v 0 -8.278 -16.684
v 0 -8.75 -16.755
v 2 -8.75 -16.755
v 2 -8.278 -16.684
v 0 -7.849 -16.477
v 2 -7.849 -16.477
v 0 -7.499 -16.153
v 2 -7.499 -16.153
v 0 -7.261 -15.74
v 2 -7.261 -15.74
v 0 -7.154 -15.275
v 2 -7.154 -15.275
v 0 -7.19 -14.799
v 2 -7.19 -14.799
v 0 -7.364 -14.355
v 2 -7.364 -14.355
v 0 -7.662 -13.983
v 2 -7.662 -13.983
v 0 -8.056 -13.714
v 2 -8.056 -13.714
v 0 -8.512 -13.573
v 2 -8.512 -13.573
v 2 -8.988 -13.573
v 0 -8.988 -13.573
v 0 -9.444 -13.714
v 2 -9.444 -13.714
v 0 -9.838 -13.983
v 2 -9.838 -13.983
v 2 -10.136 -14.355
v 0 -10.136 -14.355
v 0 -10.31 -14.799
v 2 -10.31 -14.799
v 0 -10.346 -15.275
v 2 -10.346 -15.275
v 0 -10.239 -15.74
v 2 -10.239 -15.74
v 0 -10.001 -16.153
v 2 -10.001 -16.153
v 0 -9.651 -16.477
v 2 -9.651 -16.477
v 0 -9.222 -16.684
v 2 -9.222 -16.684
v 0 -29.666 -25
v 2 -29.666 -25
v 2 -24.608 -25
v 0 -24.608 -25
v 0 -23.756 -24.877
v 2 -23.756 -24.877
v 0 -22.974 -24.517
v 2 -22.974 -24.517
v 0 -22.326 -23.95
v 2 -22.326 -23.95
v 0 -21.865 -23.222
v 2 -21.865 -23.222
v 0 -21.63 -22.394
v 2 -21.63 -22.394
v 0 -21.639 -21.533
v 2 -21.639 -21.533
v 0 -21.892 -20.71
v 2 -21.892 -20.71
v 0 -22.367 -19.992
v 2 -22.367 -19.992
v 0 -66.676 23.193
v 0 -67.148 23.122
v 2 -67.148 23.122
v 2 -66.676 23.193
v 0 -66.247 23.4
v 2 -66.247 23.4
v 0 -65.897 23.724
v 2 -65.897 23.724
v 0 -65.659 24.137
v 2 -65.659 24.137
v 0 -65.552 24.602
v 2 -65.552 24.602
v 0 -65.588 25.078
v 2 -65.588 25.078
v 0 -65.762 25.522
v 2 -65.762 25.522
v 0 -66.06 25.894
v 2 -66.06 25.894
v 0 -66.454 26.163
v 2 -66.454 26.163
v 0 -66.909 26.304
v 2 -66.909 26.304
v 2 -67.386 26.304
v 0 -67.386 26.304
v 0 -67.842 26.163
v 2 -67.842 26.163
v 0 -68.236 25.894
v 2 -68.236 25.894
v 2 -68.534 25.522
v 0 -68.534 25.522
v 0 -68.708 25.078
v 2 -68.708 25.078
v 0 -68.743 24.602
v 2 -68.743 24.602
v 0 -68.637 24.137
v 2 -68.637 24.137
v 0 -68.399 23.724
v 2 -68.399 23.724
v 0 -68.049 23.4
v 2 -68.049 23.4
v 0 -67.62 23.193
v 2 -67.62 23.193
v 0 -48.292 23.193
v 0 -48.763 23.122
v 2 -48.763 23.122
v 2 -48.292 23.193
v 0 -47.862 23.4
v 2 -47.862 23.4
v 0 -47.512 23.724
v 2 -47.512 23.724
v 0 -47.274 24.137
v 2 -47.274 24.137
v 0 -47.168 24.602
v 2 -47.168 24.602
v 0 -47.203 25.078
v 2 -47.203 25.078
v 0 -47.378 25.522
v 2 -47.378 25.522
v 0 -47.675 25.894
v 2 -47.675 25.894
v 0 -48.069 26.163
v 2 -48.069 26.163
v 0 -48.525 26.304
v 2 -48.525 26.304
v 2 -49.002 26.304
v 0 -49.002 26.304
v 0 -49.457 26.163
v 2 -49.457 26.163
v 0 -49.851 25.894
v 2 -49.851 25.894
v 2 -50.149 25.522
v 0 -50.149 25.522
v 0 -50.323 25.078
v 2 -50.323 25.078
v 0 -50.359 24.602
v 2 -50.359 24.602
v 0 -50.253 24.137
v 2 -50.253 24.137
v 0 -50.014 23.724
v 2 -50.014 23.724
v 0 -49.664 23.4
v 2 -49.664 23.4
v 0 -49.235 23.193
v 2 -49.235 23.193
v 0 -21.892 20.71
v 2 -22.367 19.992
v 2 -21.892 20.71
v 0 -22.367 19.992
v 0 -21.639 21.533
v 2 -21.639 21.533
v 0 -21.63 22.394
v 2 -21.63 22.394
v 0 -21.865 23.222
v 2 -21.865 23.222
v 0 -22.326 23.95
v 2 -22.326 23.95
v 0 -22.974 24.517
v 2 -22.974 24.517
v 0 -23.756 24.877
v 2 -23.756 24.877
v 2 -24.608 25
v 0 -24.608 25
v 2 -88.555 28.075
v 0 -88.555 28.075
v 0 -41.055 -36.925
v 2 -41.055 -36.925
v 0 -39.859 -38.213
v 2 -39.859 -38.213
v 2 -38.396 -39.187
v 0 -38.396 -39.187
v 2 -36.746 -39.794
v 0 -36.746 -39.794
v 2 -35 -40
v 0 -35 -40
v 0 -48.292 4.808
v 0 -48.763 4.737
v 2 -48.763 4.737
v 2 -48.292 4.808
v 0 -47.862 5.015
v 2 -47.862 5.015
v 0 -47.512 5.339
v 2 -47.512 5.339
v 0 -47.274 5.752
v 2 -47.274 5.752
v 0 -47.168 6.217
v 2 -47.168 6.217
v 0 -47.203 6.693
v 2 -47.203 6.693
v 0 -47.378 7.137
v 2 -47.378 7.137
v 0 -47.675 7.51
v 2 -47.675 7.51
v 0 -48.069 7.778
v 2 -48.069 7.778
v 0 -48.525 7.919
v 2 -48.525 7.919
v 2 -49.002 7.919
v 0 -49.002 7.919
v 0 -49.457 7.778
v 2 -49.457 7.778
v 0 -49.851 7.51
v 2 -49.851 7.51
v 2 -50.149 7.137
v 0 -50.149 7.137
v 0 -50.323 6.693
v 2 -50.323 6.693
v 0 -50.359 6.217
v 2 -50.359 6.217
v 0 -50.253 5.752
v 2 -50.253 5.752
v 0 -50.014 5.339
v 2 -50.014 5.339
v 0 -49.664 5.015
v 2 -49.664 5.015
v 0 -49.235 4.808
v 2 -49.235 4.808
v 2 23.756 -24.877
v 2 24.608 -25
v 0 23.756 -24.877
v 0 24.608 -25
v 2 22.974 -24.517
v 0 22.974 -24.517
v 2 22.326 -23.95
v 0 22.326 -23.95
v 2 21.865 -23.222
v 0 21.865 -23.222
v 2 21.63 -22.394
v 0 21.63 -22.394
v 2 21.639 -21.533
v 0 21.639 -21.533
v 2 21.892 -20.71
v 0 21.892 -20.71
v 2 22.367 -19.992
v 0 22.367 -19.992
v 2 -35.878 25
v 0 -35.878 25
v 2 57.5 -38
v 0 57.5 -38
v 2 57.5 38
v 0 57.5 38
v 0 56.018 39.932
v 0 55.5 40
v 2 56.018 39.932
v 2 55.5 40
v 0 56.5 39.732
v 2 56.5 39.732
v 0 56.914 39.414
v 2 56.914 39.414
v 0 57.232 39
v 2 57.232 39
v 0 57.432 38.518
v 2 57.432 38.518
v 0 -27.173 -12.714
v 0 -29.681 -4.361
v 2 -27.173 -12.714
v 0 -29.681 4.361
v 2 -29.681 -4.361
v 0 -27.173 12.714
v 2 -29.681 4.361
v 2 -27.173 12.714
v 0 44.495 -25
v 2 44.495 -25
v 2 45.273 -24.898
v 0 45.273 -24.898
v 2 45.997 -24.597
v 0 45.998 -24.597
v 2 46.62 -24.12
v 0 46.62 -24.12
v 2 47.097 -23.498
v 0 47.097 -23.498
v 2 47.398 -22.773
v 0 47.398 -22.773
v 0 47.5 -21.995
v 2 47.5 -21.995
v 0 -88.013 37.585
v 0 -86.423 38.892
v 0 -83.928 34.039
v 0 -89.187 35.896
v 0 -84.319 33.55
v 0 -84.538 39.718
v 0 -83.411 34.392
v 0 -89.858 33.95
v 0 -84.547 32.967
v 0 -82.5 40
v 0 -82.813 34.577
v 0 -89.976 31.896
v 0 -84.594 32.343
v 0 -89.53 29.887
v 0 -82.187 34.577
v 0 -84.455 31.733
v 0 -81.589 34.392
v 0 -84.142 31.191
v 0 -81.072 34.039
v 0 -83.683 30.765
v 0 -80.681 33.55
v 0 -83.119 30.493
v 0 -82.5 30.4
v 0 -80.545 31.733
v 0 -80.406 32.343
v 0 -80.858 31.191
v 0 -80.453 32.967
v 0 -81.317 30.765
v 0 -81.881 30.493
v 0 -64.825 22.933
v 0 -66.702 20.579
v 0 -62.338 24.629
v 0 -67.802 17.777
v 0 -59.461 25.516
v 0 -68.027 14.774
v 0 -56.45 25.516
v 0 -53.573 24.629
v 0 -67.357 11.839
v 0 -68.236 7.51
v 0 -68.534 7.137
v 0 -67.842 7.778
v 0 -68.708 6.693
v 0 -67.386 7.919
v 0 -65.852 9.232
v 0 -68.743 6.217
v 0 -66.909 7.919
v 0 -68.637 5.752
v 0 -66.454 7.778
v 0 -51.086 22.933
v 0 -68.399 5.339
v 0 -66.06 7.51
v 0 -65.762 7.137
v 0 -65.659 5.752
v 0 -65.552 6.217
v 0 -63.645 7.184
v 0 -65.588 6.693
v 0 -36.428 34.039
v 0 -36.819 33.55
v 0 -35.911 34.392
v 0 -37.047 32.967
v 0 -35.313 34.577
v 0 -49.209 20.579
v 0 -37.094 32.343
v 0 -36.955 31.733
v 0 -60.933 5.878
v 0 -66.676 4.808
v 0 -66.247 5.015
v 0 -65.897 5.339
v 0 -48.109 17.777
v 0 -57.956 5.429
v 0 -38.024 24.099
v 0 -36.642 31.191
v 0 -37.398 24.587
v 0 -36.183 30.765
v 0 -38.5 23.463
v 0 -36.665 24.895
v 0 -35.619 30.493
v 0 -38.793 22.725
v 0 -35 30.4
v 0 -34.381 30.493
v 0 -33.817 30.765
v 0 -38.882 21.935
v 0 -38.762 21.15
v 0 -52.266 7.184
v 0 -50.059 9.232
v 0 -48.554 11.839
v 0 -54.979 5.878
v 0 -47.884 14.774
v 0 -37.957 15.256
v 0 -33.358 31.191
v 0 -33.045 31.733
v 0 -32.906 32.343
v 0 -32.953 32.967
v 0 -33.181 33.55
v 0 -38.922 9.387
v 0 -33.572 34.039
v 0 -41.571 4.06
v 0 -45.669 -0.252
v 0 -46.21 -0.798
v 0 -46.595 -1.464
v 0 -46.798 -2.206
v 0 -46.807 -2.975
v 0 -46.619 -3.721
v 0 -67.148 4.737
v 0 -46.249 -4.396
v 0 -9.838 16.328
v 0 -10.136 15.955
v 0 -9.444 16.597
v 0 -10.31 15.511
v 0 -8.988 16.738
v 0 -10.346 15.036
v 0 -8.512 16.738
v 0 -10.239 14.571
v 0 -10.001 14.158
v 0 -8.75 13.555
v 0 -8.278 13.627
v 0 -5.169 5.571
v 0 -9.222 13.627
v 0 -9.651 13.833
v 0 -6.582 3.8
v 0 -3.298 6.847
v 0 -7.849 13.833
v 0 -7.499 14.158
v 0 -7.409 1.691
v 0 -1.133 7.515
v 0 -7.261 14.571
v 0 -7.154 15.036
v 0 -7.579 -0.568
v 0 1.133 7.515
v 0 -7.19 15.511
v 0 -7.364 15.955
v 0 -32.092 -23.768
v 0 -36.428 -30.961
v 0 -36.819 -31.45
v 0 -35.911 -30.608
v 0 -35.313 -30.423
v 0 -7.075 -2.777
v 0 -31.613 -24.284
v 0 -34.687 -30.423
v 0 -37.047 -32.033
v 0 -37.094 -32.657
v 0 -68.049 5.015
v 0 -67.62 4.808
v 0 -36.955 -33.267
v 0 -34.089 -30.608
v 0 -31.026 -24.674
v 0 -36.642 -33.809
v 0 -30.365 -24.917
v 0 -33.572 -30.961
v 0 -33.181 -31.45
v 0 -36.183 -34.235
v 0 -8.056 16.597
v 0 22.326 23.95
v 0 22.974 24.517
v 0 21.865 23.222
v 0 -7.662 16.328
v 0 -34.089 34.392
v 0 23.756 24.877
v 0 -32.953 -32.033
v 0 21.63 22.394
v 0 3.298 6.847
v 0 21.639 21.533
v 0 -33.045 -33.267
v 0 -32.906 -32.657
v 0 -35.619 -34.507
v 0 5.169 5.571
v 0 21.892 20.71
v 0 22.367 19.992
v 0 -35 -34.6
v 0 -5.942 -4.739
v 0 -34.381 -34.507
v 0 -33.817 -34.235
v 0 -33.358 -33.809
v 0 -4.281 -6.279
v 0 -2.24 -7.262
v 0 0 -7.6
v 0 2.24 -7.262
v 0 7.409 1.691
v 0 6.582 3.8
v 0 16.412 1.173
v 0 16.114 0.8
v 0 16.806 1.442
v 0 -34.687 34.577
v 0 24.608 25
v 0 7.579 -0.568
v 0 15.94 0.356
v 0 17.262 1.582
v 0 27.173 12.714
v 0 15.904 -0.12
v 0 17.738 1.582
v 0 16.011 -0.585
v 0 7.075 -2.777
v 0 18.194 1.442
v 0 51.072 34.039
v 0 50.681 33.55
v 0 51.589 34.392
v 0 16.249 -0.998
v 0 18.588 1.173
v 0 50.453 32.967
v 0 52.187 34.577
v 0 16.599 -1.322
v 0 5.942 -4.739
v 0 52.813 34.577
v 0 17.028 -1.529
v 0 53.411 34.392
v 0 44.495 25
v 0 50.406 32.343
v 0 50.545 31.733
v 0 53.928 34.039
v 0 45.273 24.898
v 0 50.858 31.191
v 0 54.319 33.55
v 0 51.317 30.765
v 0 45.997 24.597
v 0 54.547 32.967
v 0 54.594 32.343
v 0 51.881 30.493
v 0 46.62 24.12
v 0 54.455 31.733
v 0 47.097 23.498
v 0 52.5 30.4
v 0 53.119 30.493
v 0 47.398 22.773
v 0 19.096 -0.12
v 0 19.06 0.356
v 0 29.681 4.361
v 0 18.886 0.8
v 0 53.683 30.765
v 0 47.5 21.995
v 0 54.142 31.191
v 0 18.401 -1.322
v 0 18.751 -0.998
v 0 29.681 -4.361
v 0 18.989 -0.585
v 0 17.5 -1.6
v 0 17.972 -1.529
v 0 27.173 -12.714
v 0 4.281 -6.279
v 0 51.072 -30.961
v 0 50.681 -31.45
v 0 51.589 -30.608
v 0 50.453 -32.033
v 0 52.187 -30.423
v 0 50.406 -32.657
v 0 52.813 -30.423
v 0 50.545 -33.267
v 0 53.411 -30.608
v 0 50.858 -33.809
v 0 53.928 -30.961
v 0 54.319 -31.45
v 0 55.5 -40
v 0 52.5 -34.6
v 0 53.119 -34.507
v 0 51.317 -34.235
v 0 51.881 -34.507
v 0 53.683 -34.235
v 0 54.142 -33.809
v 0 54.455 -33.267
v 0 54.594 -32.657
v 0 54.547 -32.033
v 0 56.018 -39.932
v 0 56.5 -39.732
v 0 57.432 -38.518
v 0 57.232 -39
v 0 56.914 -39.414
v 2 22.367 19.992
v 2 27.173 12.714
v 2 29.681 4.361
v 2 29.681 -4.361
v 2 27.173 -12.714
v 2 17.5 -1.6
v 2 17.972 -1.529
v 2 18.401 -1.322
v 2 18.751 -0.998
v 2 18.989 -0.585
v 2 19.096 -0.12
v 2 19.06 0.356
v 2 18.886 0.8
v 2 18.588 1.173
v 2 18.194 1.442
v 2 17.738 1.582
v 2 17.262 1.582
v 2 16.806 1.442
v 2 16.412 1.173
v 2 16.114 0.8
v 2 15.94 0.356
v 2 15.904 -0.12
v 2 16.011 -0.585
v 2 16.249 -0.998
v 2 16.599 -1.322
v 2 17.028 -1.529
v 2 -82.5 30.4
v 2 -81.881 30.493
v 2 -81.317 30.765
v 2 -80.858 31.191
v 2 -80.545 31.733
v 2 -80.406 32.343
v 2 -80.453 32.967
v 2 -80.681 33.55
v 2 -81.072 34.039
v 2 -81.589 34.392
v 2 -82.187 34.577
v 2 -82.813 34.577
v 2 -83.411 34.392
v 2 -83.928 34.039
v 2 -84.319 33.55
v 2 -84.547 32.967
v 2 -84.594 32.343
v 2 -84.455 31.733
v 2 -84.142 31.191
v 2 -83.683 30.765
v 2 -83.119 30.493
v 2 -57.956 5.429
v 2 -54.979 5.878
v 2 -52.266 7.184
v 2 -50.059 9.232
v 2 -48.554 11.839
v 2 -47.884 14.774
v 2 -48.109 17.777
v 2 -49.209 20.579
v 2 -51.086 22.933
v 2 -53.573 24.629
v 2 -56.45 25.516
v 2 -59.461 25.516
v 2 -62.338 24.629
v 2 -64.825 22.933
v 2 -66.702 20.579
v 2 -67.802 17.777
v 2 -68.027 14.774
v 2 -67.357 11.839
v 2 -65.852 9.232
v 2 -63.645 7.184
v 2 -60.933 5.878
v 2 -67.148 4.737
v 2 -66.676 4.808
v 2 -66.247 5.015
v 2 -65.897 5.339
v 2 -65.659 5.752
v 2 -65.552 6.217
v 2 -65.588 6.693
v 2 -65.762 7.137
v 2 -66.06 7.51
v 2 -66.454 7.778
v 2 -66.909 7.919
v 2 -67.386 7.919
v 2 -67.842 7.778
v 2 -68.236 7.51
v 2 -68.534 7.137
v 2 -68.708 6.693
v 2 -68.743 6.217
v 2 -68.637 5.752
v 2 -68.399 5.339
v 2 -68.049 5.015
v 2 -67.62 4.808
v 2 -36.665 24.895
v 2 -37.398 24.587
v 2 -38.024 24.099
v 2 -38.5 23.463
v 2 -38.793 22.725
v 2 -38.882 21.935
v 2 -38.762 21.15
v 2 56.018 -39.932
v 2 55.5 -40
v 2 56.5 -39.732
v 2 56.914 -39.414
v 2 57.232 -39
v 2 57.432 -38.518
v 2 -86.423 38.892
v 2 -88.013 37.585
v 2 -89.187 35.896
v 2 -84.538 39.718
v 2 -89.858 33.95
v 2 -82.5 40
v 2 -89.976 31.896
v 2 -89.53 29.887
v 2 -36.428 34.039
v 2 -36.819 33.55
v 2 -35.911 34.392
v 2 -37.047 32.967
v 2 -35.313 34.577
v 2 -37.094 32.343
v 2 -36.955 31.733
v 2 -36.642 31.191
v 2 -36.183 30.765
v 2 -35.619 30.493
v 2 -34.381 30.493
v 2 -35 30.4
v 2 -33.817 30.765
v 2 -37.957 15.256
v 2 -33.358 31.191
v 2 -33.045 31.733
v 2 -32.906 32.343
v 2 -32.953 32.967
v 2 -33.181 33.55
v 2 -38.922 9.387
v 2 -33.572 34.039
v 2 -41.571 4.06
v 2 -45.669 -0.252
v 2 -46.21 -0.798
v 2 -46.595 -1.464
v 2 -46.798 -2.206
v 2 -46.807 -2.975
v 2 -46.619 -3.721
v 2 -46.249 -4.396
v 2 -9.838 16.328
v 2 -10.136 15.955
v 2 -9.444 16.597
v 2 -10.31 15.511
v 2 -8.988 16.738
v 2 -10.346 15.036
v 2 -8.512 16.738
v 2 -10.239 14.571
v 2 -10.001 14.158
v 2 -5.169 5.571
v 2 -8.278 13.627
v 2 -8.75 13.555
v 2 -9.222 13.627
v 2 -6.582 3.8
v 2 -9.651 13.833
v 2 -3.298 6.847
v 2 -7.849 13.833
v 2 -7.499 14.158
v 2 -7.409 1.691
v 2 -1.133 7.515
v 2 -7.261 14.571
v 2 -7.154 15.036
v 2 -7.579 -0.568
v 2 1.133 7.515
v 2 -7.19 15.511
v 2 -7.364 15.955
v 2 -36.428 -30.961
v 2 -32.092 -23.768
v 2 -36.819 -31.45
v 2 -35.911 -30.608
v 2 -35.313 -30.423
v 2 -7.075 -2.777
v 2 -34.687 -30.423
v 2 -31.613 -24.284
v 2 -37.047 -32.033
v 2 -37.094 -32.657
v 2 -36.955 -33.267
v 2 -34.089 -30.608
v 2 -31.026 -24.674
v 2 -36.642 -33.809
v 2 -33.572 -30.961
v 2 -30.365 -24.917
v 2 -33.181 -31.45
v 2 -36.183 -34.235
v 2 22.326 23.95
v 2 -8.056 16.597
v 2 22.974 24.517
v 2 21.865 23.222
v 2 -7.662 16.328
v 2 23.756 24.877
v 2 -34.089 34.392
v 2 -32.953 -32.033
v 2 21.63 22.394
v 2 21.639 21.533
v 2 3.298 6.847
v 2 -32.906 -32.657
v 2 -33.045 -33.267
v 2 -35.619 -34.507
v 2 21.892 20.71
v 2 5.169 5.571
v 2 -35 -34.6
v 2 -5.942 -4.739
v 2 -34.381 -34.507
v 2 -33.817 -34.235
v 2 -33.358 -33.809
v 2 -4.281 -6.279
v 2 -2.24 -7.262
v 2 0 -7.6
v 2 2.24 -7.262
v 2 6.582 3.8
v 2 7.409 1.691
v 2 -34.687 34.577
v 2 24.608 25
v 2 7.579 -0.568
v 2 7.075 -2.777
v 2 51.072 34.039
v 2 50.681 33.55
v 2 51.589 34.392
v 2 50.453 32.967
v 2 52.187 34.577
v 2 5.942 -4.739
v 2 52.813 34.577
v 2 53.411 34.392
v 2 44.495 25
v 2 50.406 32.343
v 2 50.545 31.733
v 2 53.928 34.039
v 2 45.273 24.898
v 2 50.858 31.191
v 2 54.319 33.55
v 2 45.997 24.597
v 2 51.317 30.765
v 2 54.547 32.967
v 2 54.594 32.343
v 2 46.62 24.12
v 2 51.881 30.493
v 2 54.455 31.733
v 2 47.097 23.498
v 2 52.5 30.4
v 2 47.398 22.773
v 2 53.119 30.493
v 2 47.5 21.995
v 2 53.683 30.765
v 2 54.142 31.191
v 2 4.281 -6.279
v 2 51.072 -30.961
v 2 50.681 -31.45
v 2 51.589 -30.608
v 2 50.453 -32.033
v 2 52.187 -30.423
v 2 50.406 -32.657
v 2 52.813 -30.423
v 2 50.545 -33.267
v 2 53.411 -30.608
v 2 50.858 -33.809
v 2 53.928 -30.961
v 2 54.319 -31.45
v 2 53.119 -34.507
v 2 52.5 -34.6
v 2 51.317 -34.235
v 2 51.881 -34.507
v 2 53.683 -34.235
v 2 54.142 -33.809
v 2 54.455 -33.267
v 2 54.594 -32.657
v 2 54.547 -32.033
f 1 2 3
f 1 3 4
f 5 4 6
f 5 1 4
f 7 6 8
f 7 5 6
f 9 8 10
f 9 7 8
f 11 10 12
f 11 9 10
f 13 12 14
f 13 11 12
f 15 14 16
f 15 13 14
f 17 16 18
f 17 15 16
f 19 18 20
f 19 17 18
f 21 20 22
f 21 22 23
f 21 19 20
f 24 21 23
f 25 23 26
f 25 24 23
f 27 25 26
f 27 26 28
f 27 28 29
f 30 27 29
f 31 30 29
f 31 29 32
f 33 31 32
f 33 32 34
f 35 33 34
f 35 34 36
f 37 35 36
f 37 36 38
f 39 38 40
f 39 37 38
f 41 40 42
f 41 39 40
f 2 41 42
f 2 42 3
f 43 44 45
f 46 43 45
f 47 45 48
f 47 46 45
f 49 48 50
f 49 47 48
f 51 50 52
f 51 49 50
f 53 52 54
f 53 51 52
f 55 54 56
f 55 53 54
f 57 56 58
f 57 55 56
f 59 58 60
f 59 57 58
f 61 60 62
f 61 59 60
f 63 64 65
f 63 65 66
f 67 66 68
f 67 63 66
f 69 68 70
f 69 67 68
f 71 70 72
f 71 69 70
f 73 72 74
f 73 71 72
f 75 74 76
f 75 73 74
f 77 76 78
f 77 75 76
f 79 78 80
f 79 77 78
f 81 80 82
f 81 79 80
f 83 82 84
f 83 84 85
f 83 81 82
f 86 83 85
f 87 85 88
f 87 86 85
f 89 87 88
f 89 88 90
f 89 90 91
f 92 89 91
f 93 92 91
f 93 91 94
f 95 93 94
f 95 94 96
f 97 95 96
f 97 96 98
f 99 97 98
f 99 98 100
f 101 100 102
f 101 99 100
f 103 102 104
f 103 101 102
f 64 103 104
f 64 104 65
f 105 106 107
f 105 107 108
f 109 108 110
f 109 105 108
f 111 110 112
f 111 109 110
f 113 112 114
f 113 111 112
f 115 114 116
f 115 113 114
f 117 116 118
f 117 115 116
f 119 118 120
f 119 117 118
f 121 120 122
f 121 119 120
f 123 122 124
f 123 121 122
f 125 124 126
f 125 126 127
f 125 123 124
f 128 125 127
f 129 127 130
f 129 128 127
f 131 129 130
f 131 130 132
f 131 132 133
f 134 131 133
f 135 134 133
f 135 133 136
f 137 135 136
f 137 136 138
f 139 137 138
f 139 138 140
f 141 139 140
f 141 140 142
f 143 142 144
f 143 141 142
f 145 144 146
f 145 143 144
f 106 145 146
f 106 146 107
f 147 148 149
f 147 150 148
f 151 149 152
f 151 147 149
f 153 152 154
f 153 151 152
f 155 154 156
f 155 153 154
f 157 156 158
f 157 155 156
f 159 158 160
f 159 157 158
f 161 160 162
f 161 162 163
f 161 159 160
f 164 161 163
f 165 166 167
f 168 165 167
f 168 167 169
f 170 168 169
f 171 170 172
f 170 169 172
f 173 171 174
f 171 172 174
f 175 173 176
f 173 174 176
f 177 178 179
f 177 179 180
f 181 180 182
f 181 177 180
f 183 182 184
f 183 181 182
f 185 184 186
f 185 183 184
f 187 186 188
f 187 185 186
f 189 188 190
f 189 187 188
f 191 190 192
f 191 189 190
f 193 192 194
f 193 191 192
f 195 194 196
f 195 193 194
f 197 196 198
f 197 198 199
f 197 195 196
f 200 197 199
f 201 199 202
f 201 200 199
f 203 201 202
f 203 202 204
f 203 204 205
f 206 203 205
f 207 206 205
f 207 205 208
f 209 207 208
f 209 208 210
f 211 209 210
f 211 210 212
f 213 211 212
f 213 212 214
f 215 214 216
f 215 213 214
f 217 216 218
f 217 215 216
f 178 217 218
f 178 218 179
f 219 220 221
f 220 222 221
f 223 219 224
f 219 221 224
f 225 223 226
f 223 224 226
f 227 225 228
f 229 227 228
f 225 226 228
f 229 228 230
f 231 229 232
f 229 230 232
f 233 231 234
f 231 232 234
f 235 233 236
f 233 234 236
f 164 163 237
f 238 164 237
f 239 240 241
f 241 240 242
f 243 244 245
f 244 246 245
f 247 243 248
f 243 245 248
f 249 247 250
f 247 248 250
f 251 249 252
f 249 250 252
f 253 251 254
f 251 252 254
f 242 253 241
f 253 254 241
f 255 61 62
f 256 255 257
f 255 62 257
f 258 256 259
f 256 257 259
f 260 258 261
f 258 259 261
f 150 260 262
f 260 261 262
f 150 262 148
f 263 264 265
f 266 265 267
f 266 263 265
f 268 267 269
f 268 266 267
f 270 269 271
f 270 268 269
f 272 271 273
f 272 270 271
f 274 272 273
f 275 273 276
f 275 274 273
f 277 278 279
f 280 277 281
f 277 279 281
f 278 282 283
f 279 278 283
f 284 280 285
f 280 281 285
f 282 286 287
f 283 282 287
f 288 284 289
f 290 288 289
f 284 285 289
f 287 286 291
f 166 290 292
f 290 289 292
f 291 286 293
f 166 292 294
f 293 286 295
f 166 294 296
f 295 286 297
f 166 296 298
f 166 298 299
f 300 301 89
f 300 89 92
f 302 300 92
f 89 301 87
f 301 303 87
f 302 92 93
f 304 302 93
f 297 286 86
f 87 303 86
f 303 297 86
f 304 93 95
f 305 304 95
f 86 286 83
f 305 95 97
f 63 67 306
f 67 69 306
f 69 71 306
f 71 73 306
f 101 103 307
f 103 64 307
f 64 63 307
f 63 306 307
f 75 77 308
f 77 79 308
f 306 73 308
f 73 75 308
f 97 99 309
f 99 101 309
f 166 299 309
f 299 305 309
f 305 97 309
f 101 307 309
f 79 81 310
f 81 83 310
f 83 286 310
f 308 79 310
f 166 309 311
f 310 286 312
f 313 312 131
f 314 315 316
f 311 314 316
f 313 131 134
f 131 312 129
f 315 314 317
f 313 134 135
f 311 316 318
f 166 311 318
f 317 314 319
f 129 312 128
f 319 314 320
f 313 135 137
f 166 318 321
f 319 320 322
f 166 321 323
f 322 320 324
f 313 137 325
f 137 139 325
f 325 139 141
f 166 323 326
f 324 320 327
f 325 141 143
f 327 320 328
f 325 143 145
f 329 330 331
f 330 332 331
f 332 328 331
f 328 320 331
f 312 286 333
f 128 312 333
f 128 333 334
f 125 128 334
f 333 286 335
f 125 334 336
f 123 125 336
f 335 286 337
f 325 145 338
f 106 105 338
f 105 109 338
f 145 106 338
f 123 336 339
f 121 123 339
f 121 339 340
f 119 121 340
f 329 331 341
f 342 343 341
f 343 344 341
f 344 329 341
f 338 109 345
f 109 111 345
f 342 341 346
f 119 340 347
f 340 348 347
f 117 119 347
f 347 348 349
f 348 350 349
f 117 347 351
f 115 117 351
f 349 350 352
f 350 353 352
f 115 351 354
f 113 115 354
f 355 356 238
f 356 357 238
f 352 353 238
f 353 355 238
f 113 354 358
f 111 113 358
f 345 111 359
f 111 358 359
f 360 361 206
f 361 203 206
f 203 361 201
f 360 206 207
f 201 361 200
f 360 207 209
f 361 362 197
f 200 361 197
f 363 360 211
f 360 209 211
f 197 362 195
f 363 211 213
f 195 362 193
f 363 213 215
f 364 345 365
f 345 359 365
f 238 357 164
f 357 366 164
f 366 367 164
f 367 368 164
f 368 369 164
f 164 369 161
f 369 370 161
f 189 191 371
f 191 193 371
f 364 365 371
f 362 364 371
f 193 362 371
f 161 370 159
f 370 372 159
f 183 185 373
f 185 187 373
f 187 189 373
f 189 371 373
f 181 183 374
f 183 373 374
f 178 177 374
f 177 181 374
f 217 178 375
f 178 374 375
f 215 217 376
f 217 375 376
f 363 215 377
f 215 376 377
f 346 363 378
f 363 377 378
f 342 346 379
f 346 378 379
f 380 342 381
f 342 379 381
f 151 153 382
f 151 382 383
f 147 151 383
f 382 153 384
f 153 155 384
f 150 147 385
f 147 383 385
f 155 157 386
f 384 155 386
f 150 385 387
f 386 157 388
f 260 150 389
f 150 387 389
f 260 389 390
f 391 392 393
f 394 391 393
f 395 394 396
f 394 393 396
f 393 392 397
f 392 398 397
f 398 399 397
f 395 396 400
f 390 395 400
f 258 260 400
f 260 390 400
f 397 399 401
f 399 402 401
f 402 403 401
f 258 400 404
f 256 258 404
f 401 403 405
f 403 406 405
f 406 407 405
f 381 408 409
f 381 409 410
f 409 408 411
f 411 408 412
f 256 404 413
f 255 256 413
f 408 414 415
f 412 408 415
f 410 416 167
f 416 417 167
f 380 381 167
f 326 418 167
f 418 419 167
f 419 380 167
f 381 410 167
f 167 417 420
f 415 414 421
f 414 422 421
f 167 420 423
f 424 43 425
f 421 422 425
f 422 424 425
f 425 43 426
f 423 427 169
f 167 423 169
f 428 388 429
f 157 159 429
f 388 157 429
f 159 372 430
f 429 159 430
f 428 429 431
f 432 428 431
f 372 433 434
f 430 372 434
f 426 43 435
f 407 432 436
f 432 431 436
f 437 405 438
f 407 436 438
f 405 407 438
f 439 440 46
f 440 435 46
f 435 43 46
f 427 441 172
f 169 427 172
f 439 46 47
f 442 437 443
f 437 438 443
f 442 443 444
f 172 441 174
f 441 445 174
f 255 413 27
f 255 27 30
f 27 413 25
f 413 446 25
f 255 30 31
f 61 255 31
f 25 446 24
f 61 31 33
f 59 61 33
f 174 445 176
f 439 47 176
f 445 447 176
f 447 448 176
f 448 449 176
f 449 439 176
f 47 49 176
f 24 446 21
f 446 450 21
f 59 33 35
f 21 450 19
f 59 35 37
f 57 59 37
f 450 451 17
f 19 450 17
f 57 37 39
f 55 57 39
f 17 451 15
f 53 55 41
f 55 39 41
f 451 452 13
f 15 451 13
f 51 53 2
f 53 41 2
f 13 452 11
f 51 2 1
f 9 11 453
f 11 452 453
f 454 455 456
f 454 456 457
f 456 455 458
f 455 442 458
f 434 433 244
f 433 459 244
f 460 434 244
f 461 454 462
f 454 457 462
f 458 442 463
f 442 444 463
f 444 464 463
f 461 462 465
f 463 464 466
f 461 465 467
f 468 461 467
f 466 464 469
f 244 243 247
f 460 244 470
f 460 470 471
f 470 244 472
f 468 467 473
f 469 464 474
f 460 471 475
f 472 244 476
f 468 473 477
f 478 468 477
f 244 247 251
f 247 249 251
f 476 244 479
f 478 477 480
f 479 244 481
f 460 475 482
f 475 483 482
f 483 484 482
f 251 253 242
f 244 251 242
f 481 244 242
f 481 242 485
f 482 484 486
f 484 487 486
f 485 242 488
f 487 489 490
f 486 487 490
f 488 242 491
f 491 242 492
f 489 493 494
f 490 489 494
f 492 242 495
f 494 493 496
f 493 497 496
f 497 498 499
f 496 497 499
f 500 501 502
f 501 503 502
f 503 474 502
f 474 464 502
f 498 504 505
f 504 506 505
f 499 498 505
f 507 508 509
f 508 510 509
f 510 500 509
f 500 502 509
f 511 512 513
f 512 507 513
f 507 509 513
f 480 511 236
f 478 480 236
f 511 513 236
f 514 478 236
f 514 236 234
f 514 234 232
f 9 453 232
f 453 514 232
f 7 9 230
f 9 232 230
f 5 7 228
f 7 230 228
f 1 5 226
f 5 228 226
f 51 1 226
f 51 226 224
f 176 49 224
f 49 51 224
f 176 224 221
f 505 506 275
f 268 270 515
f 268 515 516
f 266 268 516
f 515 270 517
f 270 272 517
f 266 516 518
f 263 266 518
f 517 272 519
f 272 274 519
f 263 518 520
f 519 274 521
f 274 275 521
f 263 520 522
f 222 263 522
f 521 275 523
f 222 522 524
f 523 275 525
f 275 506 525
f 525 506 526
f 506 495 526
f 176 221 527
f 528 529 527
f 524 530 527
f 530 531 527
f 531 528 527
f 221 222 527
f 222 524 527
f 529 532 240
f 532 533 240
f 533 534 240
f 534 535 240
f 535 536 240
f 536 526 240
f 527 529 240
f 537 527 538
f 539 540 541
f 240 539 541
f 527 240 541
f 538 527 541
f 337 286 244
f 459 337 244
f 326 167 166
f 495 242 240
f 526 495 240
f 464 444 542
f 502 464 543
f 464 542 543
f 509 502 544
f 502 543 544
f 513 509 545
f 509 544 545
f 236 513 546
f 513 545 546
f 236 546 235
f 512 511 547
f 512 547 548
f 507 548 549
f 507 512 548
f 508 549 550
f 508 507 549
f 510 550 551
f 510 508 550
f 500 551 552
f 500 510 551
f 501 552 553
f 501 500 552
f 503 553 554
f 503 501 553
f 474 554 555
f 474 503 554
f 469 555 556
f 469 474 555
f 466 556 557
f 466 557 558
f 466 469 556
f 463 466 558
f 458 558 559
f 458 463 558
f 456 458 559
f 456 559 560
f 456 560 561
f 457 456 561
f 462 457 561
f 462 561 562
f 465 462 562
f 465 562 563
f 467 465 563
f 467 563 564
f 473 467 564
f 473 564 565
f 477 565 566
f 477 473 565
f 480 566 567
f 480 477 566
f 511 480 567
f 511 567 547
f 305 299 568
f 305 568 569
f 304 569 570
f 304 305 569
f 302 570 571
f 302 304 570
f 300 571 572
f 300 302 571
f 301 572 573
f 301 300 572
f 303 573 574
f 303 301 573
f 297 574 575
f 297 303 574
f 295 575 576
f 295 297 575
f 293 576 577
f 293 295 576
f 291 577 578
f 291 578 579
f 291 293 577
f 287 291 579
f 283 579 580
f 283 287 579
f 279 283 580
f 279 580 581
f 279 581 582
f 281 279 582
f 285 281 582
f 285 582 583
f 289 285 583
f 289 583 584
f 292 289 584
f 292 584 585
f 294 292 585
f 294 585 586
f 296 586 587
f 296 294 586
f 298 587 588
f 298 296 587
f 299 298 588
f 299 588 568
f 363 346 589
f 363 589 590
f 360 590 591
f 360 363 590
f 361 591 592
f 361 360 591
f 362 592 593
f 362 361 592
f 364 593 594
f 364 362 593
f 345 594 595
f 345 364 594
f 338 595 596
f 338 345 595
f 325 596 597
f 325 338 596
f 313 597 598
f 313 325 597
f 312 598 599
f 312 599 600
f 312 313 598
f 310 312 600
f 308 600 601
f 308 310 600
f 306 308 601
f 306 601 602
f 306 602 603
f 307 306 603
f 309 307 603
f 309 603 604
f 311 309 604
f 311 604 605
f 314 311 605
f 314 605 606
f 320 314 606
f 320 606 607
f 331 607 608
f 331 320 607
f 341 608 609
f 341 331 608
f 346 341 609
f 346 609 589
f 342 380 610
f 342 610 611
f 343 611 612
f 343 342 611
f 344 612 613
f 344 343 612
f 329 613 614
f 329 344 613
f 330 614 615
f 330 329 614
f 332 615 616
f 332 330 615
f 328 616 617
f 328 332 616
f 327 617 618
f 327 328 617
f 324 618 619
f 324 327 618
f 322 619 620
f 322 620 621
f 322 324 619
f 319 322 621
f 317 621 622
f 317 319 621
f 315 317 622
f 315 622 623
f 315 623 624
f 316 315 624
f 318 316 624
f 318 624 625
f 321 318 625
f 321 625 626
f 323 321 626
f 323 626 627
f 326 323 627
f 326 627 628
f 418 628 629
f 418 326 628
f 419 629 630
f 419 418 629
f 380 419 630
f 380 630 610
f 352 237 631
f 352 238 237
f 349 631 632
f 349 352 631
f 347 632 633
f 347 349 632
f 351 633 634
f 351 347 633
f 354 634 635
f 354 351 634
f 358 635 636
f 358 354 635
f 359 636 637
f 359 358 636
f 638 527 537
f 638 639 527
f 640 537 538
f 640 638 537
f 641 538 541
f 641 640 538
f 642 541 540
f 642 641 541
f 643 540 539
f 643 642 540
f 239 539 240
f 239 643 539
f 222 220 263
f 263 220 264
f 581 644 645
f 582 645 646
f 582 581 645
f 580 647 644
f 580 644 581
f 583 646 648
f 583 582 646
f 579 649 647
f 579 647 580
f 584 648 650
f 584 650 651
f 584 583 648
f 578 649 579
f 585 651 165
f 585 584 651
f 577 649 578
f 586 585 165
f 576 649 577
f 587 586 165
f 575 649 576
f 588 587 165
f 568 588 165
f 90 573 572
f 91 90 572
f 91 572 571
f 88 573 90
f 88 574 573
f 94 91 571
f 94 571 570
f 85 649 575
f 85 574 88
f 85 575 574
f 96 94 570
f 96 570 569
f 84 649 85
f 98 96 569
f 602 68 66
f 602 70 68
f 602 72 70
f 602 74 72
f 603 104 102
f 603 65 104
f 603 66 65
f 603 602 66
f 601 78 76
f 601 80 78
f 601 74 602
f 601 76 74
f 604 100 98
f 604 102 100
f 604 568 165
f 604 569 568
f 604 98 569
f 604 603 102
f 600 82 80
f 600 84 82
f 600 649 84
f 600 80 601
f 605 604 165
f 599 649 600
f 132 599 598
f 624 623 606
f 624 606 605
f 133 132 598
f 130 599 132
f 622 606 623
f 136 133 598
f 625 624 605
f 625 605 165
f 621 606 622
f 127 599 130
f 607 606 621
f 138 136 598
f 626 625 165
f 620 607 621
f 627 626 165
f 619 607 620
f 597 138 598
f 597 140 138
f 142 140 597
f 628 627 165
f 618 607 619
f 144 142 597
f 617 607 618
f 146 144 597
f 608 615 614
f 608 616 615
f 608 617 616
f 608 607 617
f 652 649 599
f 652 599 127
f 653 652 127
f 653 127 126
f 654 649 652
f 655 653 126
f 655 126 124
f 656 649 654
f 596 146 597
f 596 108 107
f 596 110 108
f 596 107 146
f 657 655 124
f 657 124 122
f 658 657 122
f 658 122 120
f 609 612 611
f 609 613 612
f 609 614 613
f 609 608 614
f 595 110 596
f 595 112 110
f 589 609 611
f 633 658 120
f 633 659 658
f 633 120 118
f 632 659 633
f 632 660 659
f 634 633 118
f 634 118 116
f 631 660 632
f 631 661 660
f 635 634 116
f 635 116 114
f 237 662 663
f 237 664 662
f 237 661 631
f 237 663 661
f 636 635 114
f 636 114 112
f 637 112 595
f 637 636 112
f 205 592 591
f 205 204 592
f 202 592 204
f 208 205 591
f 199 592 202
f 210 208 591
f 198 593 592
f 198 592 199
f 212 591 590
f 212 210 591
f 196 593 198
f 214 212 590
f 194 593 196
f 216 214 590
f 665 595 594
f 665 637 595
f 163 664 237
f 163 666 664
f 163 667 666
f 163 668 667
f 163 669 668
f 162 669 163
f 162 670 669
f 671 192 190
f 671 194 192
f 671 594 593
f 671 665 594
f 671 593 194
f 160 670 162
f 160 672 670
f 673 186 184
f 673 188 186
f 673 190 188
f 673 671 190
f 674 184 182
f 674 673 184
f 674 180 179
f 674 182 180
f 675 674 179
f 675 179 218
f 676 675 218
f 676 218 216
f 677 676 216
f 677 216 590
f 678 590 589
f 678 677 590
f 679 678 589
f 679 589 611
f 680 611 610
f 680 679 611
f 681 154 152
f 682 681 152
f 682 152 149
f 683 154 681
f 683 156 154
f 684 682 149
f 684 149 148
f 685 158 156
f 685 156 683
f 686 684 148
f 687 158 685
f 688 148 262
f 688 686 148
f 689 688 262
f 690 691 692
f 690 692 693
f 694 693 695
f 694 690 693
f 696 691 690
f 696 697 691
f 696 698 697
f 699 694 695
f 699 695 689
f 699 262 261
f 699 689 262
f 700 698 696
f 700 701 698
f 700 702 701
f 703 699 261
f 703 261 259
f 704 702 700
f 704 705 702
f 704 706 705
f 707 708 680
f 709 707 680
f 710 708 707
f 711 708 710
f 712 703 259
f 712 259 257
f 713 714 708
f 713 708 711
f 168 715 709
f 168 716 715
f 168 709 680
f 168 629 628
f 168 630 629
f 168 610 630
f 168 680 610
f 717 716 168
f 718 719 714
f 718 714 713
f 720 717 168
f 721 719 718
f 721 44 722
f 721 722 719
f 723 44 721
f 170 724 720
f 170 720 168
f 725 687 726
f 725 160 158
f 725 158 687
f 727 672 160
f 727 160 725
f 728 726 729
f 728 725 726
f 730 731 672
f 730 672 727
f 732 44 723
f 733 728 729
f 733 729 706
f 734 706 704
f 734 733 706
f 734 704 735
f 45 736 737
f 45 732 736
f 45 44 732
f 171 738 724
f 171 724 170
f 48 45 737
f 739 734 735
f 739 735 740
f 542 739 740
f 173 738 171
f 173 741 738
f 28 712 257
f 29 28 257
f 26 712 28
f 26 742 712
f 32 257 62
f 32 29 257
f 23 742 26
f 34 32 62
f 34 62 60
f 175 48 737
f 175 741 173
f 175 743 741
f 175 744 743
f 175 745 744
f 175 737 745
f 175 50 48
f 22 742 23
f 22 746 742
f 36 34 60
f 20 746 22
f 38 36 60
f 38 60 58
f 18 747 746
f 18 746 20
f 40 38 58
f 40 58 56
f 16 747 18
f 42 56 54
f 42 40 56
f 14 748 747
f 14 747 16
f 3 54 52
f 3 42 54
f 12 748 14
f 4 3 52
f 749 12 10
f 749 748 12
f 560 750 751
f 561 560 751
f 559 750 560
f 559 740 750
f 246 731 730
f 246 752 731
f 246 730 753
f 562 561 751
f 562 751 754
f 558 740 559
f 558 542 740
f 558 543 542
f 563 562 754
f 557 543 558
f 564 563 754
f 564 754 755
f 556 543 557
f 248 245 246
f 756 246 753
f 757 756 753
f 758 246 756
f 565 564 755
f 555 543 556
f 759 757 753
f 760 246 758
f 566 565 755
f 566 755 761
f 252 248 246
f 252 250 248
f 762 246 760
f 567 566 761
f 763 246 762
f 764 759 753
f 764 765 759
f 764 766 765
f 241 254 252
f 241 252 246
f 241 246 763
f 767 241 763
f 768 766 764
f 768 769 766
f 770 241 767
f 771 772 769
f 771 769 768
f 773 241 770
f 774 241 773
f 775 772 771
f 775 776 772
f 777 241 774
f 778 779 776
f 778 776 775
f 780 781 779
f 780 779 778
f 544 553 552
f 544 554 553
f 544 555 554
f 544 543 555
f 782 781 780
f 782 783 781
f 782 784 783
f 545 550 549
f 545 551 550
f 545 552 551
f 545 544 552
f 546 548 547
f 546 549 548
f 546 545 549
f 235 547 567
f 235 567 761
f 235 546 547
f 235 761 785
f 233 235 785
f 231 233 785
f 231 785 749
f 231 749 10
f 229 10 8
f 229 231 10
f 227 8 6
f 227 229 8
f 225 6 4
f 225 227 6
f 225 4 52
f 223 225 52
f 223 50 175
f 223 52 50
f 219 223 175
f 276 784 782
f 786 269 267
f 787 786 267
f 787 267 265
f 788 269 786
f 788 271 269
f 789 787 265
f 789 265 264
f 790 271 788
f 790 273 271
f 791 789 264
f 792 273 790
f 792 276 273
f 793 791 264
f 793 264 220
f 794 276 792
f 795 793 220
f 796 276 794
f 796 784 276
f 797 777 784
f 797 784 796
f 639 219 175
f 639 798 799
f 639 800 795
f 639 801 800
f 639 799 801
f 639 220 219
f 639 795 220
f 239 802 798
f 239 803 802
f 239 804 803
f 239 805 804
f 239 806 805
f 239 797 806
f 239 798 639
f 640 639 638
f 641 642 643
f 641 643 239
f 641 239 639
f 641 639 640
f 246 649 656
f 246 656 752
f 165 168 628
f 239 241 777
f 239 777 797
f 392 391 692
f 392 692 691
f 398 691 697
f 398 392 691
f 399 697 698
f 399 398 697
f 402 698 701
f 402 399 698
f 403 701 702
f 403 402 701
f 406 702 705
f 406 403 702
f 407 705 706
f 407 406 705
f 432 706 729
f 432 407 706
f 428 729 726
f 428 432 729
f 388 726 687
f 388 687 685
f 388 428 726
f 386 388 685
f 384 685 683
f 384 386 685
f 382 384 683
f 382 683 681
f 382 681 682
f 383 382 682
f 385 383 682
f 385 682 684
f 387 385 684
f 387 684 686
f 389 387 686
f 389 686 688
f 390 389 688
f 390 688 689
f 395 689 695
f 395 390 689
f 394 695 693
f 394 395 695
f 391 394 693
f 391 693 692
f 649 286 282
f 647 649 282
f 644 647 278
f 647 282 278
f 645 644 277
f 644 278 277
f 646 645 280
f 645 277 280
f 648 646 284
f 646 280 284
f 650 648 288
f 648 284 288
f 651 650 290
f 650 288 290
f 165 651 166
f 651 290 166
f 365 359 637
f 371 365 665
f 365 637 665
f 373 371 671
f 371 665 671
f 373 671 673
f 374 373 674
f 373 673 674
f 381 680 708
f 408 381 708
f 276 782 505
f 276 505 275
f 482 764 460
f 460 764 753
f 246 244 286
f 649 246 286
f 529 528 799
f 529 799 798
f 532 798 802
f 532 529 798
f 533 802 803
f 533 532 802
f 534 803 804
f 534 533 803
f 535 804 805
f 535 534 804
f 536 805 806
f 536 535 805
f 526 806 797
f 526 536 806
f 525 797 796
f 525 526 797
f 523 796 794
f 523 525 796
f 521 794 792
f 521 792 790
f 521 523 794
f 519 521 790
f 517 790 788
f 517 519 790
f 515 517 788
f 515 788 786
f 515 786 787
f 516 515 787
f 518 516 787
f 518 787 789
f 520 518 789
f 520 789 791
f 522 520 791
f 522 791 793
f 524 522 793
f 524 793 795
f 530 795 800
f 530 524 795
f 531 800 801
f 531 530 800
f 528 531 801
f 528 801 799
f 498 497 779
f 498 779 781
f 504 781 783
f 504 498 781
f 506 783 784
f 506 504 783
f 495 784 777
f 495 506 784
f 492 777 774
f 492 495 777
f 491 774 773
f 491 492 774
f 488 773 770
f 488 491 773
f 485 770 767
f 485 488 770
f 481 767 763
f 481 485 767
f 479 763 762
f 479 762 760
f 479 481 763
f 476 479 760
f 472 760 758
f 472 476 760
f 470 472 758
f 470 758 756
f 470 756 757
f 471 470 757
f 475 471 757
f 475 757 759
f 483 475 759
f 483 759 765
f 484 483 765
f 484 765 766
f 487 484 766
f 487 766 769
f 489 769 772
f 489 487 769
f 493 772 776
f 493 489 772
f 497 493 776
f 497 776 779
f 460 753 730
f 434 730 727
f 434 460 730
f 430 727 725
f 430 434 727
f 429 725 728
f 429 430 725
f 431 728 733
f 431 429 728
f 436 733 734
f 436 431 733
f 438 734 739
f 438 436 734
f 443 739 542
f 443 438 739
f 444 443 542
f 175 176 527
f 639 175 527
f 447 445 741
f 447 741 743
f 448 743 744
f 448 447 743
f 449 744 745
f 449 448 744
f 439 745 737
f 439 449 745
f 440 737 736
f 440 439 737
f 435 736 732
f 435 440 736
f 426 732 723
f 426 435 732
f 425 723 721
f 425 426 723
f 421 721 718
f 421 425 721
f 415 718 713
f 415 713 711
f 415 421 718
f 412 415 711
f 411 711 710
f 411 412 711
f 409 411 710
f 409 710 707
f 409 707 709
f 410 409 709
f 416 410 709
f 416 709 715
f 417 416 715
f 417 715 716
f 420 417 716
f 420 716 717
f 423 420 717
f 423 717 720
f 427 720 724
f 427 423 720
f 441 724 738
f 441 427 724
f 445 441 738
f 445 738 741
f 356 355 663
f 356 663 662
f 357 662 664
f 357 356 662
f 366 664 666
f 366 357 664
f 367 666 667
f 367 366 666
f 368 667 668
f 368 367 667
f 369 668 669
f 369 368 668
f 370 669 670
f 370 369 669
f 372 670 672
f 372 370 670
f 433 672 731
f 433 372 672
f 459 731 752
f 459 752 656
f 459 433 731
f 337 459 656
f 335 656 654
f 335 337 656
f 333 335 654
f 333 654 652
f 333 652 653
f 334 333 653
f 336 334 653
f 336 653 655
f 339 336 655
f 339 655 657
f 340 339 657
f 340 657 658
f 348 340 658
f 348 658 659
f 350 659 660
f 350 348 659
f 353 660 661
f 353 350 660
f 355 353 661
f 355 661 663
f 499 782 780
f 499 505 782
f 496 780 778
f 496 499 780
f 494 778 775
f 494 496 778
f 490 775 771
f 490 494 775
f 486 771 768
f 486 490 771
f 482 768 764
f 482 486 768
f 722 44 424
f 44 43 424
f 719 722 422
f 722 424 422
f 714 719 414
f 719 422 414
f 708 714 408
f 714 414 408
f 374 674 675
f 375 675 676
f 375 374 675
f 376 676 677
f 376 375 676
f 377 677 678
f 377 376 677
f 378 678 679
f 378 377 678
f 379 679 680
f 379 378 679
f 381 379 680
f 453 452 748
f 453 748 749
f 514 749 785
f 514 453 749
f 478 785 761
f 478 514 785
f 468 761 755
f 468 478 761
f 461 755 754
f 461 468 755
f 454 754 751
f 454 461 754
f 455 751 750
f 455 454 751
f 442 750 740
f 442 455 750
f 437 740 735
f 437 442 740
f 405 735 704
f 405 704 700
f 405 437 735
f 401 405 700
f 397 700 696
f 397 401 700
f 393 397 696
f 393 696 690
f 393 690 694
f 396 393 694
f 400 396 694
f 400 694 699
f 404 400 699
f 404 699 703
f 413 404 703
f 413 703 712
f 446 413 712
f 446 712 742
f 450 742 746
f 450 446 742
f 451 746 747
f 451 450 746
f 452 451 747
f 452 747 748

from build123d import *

# Parameters (mm, degrees)
SKETCH_1_R          = 1.6
SKETCH_1_R_2        = 10.1
SKETCH_1_R_3        = 2.1
SKETCH_1_R_4        = 7.6
EXTRUDE_1_DEPTH     = 2
SKETCH_3_W          = 50
SKETCH_3_H          = 5
CUT_EXTRUDE_1_DEPTH = 99.508882848
FILLET_1_R          = 3.005
FILLET_2_R          = 2


with BuildPart() as part:
    # ｽｹｯﾁ1 → ﾎﾞｽ - 押し出し1 (new body)
    with BuildSketch(Plane(origin=(0, 0, 0), x_dir=(0, 0, -1), z_dir=(1, 0, 0))):
        with BuildLine():
            Line((-28.07487558, -88.555433417), (36.92512442, -41.055433417))
            ThreePointArc((36.92512442, -41.055433417), (39.187242823, -38.395700727), (40, -35))
            Line((40, -35), (40, 57.5))
            Line((40, 57.5), (-40, 57.5))
            Line((-40, 57.5), (-40, -82.5))
            ThreePointArc((-40, -82.5), (-35.895700727, -89.187242823), (-28.07487558, -88.555433417))
        make_face()
        with Locations((-24.721530862, -67.147937733)):
            Circle(SKETCH_1_R, mode=Mode.SUBTRACT)
        with Locations((-15.529142706, -57.955549577)):
            Circle(SKETCH_1_R_2, mode=Mode.SUBTRACT)
        with Locations((-6.336754551, -67.147937733)):
            Circle(SKETCH_1_R, mode=Mode.SUBTRACT)
        with Locations((-32.5, -35)):
            Circle(SKETCH_1_R_3, mode=Mode.SUBTRACT)
        with Locations((-24.721530862, -48.763161422)):
            Circle(SKETCH_1_R, mode=Mode.SUBTRACT)
        with Locations((-6.336754551, -48.763161422)):
            Circle(SKETCH_1_R, mode=Mode.SUBTRACT)
        with Locations((-15.155444566, -8.75)):
            Circle(SKETCH_1_R, mode=Mode.SUBTRACT)
        with Locations((-32.5, 52.5)):
            Circle(SKETCH_1_R_3, mode=Mode.SUBTRACT)
        Circle(SKETCH_1_R_4, mode=Mode.SUBTRACT)
        with Locations((15.155444566, -8.75)):
            Circle(SKETCH_1_R, mode=Mode.SUBTRACT)
        with Locations((0, 17.5)):
            Circle(SKETCH_1_R, mode=Mode.SUBTRACT)
        with Locations((32.5, 52.5)):
            Circle(SKETCH_1_R_3, mode=Mode.SUBTRACT)
        with Locations((32.5, -35)):
            Circle(SKETCH_1_R_3, mode=Mode.SUBTRACT)
        with Locations((-32.5, -82.5)):
            Circle(SKETCH_1_R_3, mode=Mode.SUBTRACT)
    extrude(amount=EXTRUDE_1_DEPTH)

    # ｽｹｯﾁ3 → ｶｯﾄ - 押し出し1 (cut, through all)
    with BuildSketch(Plane(origin=(2, 0, 0), x_dir=(0, 0, -1), z_dir=(1, 0, 0))):
        with BuildLine():
            Line((25, -31.191591045), (25, -16.583123952))
            ThreePointArc((25, -16.583123952), (0, -30), (-25, -16.583123952))
            Line((-25, -16.583123952), (-25, -40.340134109))
            ThreePointArc((-25, -40.340134109), (-9.984170602, -38.739585267), (1.870513324, -48.093908232))
            Line((1.870513324, -48.093908232), (25, -31.191591045))
        make_face()
        with BuildLine():
            Line((25, 16.583123952), (25, 42.5))
            Line((25, 42.5), (-25, 42.5))
            Line((-25, 42.5), (-25, 16.583123952))
            ThreePointArc((-25, 16.583123952), (0, 30), (25, 16.583123952))
        make_face()
        with Locations((0, 45)):
            Rectangle(SKETCH_3_W, SKETCH_3_H)
    extrude(amount=-CUT_EXTRUDE_1_DEPTH, mode=Mode.SUBTRACT)

    # ﾌｨﾚｯﾄ1
    fillet_1_edges = [part.edges().sort_by_distance(p)[0] for p in [
        (1, -48.093908232, -1.870513324),
        (1, -40.340134109, 25),
        (1, -16.583123952, 25),
        (1, -16.583123952, -25),
        (1, -31.191591045, -25),
        (1, 16.583123952, -25),
        (1, 16.583123952, 25),
        (1, 47.5, 25),
        (1, 47.5, -25),
    ]]
    fillet(fillet_1_edges, radius=FILLET_1_R)

    # ﾌｨﾚｯﾄ2
    fillet_2_edges = [part.edges().sort_by_distance(p)[0] for p in [
        (1, 57.5, 40),
        (1, 57.5, -40),
    ]]
    fillet(fillet_2_edges, radius=FILLET_2_R)


solid = part.part
